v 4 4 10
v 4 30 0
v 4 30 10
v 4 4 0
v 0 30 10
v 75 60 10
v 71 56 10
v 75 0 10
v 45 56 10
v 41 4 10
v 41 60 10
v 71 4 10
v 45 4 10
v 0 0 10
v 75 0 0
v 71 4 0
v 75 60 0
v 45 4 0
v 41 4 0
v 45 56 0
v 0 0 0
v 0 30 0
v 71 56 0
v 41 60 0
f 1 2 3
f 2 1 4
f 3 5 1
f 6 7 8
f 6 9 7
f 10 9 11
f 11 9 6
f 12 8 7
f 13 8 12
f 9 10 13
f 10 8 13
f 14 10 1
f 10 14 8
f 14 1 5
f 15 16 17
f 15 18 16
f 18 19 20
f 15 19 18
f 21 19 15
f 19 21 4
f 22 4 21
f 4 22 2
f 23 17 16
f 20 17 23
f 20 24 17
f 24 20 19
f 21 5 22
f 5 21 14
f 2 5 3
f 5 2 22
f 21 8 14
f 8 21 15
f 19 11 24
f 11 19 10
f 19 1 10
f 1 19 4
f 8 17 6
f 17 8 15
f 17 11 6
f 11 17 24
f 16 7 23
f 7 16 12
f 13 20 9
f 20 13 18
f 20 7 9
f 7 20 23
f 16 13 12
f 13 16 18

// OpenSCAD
$fn=36;

Thickness_of_shelf=37;
Length_of_fork=30;
Plug_x=26;
Plug_y=52;
Thickness_of_structure=4;
Extrusion_height=10;


difference()
{

union()
{
cube([Thickness_of_structure,Length_of_fork,Extrusion_height]);
translate([Thickness_of_shelf+Thickness_of_structure,0,0])
cube([Thickness_of_structure,Length_of_fork,Extrusion_height]);

translate([0,0,0])
rotate([0,0,0])
cube([Thickness_of_shelf+Thickness_of_structure,Thickness_of_structure,Extrusion_height]);

translate([Thickness_of_shelf+Thickness_of_structure,0,0])
cube([Plug_x+Thickness_of_structure*2,Plug_y+Thickness_of_structure*2,10]);

}

translate([Thickness_of_shelf+Thickness_of_structure*2,Thickness_of_structure,-Extrusion_height/2])
cube([Plug_x,Plug_y,Extrusion_height*2]);

}
